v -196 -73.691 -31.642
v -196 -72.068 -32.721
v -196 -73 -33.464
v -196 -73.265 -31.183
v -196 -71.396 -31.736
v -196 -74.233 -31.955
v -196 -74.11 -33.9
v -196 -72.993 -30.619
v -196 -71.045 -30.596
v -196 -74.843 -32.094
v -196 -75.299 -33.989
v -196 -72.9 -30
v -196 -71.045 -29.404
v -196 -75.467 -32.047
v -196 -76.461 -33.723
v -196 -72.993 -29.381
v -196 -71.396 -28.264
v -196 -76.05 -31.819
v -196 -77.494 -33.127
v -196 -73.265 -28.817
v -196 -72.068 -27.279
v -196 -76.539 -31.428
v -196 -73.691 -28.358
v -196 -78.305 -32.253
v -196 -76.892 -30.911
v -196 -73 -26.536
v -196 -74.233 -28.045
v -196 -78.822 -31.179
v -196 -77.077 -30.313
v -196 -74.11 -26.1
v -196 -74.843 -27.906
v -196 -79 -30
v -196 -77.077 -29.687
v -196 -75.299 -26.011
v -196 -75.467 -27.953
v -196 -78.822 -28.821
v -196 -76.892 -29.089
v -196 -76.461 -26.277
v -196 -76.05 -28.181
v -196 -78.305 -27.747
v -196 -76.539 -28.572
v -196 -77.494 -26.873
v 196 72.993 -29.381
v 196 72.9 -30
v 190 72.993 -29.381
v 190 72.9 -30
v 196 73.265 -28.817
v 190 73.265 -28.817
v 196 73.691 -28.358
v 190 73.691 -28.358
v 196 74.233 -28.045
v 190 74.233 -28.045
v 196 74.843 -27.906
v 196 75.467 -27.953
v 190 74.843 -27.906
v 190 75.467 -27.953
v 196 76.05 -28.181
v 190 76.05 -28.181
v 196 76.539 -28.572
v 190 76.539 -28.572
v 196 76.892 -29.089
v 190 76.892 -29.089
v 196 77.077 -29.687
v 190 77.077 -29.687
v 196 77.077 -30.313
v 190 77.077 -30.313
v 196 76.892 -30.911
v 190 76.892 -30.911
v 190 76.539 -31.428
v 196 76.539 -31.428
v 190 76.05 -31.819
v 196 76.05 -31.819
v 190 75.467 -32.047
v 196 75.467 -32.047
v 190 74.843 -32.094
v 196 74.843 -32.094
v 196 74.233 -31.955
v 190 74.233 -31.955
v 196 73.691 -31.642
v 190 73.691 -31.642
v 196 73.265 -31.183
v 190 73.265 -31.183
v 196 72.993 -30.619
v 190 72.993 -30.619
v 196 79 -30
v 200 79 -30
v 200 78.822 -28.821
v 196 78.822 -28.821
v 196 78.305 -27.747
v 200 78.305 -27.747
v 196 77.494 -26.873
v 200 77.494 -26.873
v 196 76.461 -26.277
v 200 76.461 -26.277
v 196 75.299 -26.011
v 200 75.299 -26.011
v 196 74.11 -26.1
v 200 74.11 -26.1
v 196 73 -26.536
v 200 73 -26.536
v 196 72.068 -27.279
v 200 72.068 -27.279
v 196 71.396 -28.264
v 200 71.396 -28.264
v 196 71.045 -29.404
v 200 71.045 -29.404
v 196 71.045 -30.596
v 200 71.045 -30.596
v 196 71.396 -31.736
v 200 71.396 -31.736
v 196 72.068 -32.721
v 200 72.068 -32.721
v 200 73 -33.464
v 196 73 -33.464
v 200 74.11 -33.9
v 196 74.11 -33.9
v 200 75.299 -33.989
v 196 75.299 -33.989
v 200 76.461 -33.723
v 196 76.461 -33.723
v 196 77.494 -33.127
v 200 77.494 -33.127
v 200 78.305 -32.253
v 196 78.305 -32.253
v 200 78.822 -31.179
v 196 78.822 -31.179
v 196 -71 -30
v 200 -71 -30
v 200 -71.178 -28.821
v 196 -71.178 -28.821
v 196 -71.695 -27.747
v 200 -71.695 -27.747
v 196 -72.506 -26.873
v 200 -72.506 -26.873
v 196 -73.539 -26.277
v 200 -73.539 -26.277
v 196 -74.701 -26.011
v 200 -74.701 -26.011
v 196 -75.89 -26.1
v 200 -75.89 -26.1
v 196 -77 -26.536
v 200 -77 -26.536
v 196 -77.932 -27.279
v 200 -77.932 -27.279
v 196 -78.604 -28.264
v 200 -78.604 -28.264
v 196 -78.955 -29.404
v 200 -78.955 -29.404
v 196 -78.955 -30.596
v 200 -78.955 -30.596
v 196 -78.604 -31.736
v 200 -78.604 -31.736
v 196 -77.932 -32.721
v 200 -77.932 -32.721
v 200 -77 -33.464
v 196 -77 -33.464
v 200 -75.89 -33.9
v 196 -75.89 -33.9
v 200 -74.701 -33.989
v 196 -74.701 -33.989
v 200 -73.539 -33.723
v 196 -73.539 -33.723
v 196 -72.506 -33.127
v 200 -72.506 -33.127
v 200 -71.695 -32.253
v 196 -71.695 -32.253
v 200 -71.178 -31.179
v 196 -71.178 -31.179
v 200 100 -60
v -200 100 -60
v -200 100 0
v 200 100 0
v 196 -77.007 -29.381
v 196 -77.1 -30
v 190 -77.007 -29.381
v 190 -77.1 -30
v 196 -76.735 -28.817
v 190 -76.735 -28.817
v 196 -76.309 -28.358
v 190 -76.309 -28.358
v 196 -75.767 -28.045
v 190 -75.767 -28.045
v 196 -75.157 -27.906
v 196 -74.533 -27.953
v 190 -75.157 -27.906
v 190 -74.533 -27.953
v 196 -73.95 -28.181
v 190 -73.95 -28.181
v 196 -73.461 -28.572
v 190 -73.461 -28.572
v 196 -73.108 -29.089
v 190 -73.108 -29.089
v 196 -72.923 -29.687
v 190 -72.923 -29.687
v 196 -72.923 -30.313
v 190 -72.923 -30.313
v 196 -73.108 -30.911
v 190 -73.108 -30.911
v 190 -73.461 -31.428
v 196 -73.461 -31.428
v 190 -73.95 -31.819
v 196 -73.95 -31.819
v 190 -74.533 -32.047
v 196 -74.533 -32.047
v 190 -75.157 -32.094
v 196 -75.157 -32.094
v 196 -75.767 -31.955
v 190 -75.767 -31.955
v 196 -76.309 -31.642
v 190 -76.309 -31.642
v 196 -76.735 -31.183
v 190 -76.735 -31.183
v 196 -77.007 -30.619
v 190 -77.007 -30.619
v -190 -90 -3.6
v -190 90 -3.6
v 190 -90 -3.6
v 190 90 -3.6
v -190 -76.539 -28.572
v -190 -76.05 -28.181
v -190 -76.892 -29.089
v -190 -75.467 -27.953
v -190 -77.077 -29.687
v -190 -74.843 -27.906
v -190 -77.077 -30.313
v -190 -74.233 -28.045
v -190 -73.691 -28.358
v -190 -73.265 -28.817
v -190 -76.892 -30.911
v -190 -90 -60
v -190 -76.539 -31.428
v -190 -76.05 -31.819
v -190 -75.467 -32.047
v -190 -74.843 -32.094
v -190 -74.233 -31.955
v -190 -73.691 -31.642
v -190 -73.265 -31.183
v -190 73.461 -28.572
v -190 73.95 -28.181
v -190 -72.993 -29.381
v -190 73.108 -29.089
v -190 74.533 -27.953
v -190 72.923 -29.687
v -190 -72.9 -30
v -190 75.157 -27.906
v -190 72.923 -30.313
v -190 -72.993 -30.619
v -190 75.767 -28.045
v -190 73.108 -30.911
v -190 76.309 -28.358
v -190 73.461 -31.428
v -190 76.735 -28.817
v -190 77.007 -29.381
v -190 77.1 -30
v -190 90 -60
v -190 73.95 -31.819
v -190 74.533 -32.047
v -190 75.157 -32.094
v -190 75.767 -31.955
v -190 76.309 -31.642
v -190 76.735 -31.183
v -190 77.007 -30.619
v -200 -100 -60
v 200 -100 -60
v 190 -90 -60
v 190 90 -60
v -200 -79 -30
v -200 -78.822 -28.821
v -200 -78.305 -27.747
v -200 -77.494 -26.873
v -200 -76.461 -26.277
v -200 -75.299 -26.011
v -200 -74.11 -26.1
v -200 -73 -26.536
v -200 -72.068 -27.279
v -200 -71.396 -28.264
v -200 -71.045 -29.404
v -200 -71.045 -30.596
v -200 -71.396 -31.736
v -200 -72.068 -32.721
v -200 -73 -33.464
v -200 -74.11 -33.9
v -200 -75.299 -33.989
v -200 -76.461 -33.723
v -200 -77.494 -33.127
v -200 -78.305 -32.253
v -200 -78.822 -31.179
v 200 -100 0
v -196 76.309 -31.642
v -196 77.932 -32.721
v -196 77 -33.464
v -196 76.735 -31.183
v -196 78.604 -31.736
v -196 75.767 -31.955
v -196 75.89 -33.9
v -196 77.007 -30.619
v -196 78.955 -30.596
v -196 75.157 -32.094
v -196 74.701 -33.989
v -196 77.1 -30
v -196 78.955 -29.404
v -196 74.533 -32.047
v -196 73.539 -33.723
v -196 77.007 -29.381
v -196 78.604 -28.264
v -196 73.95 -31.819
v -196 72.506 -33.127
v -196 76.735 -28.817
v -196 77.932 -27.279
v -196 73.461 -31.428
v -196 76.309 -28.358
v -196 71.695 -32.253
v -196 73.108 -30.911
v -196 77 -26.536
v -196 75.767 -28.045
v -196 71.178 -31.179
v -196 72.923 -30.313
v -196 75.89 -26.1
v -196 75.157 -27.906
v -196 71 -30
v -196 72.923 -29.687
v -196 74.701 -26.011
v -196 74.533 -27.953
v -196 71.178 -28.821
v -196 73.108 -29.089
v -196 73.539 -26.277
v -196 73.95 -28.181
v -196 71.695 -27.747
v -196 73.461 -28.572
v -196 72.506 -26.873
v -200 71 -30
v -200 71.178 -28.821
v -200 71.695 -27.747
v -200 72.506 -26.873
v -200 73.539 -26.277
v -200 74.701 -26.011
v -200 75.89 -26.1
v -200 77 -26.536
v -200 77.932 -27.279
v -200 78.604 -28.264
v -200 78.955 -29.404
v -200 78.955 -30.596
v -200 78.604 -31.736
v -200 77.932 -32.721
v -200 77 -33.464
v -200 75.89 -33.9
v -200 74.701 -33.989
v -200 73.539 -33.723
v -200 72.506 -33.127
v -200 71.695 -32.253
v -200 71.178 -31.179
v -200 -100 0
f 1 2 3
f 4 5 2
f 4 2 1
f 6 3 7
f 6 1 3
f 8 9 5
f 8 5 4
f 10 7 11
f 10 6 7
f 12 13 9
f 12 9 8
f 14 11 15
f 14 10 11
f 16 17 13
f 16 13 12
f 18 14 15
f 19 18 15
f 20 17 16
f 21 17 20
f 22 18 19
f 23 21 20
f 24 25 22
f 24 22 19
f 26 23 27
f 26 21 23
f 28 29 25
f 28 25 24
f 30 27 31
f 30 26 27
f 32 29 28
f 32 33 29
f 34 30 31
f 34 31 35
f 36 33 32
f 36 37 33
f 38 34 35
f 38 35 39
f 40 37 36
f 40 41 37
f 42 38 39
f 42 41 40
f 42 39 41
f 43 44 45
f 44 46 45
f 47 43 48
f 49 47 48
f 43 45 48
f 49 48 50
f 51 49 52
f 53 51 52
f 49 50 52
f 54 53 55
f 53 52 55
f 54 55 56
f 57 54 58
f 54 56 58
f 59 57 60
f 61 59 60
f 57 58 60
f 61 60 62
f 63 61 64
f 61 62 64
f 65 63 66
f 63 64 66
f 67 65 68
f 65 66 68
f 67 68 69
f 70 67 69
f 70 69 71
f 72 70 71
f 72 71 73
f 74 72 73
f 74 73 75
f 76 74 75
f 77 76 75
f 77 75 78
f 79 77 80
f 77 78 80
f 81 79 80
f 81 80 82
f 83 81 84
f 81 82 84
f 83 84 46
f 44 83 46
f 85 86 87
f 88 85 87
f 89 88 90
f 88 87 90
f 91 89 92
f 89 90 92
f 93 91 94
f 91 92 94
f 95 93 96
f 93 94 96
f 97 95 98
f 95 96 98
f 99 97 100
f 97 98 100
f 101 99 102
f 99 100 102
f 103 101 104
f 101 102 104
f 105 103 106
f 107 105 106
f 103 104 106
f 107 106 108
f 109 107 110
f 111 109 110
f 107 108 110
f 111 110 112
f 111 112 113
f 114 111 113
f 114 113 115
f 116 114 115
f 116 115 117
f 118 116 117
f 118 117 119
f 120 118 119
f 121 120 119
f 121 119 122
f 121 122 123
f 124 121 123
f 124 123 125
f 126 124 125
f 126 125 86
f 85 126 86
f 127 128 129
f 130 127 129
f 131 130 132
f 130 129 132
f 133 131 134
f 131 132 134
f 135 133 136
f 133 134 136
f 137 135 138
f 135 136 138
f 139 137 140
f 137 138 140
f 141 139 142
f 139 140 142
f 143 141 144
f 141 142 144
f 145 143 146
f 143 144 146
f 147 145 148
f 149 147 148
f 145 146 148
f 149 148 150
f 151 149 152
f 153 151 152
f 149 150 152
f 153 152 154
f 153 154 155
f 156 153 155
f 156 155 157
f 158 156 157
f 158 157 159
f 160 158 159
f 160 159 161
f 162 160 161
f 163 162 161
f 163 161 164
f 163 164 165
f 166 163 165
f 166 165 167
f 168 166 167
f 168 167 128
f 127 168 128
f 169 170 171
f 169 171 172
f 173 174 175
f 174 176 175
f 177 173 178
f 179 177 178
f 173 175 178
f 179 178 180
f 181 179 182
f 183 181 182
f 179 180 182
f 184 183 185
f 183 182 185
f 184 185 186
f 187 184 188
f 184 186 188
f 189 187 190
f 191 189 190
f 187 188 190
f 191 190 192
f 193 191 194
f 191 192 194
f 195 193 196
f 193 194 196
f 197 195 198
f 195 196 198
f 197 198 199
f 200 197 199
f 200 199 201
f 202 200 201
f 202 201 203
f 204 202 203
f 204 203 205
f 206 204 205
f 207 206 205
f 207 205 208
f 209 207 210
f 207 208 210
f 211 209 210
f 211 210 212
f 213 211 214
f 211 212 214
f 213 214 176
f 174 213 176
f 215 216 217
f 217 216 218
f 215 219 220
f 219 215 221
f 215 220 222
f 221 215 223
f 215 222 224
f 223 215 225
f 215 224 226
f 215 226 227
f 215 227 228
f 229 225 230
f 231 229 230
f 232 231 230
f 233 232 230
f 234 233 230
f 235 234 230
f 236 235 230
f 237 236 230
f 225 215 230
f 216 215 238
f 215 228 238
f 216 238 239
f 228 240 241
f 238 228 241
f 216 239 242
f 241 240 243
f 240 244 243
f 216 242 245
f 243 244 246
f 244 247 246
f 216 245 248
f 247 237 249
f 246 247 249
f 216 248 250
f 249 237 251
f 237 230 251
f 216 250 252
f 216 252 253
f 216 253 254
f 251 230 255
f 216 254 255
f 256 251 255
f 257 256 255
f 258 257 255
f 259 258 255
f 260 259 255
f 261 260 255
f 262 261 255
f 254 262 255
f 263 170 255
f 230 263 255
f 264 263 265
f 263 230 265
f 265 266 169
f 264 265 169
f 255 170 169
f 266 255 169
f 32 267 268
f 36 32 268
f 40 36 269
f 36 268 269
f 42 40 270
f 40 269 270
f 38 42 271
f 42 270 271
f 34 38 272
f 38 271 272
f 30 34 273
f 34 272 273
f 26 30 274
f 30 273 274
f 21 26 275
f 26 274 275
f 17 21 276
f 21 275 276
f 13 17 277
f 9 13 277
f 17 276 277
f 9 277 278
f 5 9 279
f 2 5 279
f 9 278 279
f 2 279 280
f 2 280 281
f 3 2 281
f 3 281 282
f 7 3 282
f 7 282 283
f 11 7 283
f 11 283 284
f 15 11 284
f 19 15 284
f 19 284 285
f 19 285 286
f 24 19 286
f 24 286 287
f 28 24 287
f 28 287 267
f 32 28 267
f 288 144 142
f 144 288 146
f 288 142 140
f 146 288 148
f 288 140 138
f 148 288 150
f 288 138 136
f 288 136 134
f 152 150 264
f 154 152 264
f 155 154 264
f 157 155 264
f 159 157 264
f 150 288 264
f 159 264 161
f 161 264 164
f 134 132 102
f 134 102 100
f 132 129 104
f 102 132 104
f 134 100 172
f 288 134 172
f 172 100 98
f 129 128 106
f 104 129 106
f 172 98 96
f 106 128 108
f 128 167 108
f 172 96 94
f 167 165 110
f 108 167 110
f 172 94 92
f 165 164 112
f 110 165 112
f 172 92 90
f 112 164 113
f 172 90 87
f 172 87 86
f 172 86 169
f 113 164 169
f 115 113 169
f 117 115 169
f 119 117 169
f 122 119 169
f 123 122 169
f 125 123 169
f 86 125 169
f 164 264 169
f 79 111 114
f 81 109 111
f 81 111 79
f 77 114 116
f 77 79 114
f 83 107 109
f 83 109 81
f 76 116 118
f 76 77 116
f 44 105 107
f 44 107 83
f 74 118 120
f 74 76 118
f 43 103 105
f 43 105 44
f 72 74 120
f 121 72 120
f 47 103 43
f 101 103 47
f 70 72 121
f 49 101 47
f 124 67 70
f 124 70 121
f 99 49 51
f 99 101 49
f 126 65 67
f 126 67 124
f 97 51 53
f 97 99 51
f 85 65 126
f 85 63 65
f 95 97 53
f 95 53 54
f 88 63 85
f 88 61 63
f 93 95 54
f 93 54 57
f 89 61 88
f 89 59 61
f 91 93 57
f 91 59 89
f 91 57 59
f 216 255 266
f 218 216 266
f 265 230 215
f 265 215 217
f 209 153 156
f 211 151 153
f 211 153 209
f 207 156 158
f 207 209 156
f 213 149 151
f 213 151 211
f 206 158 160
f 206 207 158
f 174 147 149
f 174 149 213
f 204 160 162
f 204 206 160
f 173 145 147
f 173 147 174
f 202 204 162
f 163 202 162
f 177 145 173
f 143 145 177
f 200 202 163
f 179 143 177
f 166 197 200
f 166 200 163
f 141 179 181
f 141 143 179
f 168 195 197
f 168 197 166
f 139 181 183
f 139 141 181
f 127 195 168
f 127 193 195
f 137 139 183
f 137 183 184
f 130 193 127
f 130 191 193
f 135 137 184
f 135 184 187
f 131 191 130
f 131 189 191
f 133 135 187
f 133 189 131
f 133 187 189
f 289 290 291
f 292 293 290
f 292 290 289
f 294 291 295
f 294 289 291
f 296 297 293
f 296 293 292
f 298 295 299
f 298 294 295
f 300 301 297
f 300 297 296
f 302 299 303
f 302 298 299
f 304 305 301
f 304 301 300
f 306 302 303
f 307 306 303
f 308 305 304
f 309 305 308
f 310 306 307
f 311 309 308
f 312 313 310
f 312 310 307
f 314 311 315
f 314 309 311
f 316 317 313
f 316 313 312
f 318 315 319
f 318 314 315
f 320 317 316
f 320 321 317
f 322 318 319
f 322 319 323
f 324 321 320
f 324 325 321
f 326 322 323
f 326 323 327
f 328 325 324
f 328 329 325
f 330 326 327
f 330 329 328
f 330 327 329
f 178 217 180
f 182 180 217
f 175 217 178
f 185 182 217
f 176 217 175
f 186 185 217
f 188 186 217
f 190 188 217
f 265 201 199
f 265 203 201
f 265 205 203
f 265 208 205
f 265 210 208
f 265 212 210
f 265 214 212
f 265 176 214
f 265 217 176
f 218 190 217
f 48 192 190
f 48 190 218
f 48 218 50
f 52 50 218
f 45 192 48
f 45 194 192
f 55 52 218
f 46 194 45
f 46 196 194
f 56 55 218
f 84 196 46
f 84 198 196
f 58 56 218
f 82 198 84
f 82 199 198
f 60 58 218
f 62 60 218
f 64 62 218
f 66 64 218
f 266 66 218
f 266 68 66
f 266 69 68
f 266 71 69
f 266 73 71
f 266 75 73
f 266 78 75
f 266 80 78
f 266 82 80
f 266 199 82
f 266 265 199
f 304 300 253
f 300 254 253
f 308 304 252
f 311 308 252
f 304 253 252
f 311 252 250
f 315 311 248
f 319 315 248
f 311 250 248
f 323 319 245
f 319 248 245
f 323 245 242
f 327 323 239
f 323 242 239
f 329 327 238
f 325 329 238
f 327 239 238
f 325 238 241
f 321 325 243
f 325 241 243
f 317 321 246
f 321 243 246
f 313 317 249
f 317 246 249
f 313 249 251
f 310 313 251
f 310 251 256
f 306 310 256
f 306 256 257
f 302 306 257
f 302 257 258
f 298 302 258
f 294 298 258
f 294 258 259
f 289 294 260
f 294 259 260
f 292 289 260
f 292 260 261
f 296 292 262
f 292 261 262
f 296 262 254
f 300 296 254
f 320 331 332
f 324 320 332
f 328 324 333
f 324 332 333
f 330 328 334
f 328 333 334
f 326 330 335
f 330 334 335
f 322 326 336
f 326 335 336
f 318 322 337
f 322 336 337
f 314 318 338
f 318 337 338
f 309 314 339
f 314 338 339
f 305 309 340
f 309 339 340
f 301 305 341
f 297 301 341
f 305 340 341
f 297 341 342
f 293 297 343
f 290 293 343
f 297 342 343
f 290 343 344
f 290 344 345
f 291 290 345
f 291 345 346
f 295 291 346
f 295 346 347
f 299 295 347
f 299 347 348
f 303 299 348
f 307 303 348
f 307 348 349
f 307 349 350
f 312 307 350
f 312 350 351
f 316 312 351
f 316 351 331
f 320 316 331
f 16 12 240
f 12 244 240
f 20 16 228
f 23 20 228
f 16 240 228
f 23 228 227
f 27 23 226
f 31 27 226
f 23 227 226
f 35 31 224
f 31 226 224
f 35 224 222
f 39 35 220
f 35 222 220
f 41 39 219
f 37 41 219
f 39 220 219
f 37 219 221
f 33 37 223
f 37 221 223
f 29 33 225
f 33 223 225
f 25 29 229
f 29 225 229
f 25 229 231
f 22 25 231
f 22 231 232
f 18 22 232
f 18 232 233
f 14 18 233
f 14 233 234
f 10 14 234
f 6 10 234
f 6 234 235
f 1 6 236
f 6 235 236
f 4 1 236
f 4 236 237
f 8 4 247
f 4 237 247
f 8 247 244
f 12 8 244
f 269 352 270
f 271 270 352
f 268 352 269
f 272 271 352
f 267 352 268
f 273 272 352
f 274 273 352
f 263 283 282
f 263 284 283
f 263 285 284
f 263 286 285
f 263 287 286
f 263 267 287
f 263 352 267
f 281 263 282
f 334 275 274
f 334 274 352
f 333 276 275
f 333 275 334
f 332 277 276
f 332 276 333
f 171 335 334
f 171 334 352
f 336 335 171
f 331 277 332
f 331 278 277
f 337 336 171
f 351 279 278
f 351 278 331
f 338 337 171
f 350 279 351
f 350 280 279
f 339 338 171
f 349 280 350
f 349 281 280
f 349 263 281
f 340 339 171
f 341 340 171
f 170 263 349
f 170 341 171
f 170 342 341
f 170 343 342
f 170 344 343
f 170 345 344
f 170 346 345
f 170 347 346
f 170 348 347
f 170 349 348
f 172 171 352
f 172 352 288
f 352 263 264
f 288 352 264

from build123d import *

# Parameters (mm, degrees)
F0_W                 = 400
F0_H                 = 200
F1_DEPTH             = 3.6
F3_W                 = 400
F3_H                 = 200
F3_W_2               = 380
F3_H_2               = 180
F4_DEPTH             = 56.4
F7_D                 = 4.2
F7_DEPTH             = 12
F7_CBORE_D           = 8
F7_CBORE_DEPTH       = 4
F7_TIP               = 1.2618073
F7_ON_F5_D           = 4.2
F7_ON_F5_DEPTH       = 12
F7_ON_F5_CBORE_D     = 8
F7_ON_F5_CBORE_DEPTH = 4
F7_ON_F5_TIP         = 1.2618073


with BuildPart() as f1:
    # F0 (on Top) → F1 (new body)
    with BuildSketch(Plane.XY):
        Rectangle(F0_W, F0_H)
    extrude(amount=-F1_DEPTH)

    # F3 (on offset) → F4 (join, through all)
    with BuildSketch(Plane.XY.offset(-60)):
        Rectangle(F3_W, F3_H)
        Rectangle(F3_W_2, F3_H_2, mode=Mode.SUBTRACT)
    extrude(amount=F4_DEPTH)

    # F7
    with Locations(Plane(origin=(-200, 0, 0), x_dir=(0, -1, 0), z_dir=(-1, 0, 0))):
        with Locations((-75, -30), (75, -30)):
            CounterBoreHole(F7_D / 2, F7_CBORE_D / 2, F7_CBORE_DEPTH, depth=F7_DEPTH)
            with Locations((0, 0, -(F7_DEPTH + F7_TIP / 2))):  # 118° drill point
                Cone(0, F7_D / 2, F7_TIP, mode=Mode.SUBTRACT)

    # F7 on F5
    with Locations(Plane.YZ.offset(200)):
        with Locations((75, -30), (-75, -30)):
            CounterBoreHole(F7_ON_F5_D / 2, F7_ON_F5_CBORE_D / 2, F7_ON_F5_CBORE_DEPTH, depth=F7_ON_F5_DEPTH)
            with Locations((0, 0, -(F7_ON_F5_DEPTH + F7_ON_F5_TIP / 2))):  # 118° drill point
                Cone(0, F7_ON_F5_D / 2, F7_ON_F5_TIP, mode=Mode.SUBTRACT)


solid = f1.part
